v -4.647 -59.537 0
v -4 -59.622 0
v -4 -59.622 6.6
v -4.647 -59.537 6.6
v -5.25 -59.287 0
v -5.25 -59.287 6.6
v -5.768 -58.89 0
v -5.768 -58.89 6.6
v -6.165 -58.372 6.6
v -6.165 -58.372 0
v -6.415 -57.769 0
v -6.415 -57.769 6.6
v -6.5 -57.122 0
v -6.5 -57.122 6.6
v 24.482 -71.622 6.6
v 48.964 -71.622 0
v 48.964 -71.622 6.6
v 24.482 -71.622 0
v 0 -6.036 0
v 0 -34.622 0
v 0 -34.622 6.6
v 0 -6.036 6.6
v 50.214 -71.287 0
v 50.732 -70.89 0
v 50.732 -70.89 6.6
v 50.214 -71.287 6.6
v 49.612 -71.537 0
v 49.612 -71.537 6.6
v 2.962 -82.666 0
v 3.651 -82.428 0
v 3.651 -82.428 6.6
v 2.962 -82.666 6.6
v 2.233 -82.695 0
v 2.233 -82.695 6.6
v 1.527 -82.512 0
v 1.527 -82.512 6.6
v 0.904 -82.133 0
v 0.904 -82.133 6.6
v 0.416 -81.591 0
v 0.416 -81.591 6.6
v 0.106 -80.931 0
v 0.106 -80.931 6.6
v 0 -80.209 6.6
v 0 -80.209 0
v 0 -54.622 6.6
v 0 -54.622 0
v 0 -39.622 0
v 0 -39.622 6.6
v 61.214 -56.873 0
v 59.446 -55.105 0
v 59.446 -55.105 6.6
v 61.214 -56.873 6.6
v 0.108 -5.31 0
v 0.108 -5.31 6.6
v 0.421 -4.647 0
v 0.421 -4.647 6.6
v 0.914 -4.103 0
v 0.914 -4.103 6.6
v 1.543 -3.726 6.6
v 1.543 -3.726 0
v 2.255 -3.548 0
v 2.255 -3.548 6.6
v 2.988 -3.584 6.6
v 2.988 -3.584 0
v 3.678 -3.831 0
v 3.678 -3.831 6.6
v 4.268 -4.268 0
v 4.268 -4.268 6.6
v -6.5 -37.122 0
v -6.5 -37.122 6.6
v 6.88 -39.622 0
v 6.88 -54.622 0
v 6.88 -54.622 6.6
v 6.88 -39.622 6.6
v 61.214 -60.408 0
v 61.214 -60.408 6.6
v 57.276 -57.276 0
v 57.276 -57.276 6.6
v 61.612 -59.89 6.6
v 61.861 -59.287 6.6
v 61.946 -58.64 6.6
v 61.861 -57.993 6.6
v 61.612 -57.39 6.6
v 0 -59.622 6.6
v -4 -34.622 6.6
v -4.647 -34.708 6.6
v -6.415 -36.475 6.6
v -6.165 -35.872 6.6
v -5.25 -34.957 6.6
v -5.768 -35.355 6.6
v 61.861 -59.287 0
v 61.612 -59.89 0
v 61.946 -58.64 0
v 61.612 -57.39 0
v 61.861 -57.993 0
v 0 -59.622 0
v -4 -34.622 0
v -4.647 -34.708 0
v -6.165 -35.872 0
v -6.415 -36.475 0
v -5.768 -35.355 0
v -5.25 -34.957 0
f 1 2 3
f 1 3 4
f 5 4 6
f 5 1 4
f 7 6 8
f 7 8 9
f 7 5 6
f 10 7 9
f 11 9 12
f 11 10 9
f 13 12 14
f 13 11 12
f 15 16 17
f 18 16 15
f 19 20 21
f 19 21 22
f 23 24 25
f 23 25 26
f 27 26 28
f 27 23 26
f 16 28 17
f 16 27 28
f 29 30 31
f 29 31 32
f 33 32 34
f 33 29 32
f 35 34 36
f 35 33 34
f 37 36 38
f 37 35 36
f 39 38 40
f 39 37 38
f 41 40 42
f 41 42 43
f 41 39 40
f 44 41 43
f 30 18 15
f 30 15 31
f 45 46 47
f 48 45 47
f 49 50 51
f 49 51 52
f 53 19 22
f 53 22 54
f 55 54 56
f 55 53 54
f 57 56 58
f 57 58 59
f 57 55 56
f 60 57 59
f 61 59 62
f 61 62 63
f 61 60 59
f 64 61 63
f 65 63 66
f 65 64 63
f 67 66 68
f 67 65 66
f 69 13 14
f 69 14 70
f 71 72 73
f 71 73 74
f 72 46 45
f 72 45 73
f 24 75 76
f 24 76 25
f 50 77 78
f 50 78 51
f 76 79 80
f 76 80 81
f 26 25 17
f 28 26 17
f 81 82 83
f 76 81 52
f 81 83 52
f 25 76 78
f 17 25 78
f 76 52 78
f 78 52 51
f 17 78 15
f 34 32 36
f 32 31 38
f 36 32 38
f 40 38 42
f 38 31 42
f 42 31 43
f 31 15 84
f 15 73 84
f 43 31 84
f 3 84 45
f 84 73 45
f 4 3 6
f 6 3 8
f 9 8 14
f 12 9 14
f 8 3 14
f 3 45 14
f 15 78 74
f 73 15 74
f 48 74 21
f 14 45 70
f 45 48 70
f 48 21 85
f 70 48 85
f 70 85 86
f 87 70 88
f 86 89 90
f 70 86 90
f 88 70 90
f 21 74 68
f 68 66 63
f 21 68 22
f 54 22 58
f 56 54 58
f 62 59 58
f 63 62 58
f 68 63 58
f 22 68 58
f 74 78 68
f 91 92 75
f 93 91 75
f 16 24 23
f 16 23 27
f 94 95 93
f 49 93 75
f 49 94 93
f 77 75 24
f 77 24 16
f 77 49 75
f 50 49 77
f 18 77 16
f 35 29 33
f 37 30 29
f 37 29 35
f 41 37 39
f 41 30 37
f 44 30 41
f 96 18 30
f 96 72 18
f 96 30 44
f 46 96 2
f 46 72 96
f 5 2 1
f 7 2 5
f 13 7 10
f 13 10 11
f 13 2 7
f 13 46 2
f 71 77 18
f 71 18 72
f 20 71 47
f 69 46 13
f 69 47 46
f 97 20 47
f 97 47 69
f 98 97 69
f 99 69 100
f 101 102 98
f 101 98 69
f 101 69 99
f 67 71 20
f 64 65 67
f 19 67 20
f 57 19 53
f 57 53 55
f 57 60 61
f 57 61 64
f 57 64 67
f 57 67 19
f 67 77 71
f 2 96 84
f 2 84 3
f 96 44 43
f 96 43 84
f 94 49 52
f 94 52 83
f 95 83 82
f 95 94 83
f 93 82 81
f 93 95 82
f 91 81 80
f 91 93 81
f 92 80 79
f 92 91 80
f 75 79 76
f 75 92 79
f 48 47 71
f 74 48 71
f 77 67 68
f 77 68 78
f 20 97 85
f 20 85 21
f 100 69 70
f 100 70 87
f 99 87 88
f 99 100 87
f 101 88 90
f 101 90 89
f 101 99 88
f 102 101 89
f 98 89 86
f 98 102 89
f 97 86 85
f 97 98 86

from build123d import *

# Parameters (mm, degrees)
MODEL_W             = 6.88
MODEL_H             = 15
BOSS_EXTRUDE1_DEPTH = 6.6


with BuildPart() as part:
    # Model → Boss-Extrude1 (new body)
    with BuildSketch(Plane.XY):
        with BuildLine():
            Line((0, -59.622366364), (-4, -59.622366364))
            ThreePointArc((-4, -59.622366364), (-5.767766953, -58.890133317), (-6.5, -57.122366364))
            Line((-6.5, -57.122366364), (-6.5, -37.122366364))
            ThreePointArc((-6.5, -37.122366364), (-5.767766953, -35.354599411), (-4, -34.622366364))
            Line((-4, -34.622366364), (0, -34.622366364))
            Line((0, -34.622366364), (0, -6.035533906))
            ThreePointArc((0, -6.035533906), (1.543291419, -3.725835075), (4.267766953, -4.267766953))
            Line((4.267766953, -4.267766953), (57.275649276, -57.275649276))
            Line((57.275649276, -57.275649276), (59.446467094, -55.104831458))
            Line((59.446467094, -55.104831458), (61.214234047, -56.872598411))
            ThreePointArc((61.214234047, -56.872598411), (61.946467094, -58.640365364), (61.214234047, -60.408132317))
            Line((61.214234047, -60.408132317), (50.732233047, -70.890133317))
            ThreePointArc((50.732233047, -70.890133317), (49.921174675, -71.432065195), (48.964466094, -71.622366364))
            Line((48.964466094, -71.622366364), (24.482233047, -71.622366364))
            Line((24.482233047, -71.622366364), (3.651186429, -82.428337026))
            ThreePointArc((3.651186429, -82.428337026), (1.201532841, -82.345502849), (0, -80.209154788))
            Line((0, -80.209154788), (0, -59.622366364))
        make_face()
        with Locations((3.44, -47.122366364)):
            Rectangle(MODEL_W, MODEL_H, mode=Mode.SUBTRACT)
    extrude(amount=BOSS_EXTRUDE1_DEPTH)


solid = part.part
